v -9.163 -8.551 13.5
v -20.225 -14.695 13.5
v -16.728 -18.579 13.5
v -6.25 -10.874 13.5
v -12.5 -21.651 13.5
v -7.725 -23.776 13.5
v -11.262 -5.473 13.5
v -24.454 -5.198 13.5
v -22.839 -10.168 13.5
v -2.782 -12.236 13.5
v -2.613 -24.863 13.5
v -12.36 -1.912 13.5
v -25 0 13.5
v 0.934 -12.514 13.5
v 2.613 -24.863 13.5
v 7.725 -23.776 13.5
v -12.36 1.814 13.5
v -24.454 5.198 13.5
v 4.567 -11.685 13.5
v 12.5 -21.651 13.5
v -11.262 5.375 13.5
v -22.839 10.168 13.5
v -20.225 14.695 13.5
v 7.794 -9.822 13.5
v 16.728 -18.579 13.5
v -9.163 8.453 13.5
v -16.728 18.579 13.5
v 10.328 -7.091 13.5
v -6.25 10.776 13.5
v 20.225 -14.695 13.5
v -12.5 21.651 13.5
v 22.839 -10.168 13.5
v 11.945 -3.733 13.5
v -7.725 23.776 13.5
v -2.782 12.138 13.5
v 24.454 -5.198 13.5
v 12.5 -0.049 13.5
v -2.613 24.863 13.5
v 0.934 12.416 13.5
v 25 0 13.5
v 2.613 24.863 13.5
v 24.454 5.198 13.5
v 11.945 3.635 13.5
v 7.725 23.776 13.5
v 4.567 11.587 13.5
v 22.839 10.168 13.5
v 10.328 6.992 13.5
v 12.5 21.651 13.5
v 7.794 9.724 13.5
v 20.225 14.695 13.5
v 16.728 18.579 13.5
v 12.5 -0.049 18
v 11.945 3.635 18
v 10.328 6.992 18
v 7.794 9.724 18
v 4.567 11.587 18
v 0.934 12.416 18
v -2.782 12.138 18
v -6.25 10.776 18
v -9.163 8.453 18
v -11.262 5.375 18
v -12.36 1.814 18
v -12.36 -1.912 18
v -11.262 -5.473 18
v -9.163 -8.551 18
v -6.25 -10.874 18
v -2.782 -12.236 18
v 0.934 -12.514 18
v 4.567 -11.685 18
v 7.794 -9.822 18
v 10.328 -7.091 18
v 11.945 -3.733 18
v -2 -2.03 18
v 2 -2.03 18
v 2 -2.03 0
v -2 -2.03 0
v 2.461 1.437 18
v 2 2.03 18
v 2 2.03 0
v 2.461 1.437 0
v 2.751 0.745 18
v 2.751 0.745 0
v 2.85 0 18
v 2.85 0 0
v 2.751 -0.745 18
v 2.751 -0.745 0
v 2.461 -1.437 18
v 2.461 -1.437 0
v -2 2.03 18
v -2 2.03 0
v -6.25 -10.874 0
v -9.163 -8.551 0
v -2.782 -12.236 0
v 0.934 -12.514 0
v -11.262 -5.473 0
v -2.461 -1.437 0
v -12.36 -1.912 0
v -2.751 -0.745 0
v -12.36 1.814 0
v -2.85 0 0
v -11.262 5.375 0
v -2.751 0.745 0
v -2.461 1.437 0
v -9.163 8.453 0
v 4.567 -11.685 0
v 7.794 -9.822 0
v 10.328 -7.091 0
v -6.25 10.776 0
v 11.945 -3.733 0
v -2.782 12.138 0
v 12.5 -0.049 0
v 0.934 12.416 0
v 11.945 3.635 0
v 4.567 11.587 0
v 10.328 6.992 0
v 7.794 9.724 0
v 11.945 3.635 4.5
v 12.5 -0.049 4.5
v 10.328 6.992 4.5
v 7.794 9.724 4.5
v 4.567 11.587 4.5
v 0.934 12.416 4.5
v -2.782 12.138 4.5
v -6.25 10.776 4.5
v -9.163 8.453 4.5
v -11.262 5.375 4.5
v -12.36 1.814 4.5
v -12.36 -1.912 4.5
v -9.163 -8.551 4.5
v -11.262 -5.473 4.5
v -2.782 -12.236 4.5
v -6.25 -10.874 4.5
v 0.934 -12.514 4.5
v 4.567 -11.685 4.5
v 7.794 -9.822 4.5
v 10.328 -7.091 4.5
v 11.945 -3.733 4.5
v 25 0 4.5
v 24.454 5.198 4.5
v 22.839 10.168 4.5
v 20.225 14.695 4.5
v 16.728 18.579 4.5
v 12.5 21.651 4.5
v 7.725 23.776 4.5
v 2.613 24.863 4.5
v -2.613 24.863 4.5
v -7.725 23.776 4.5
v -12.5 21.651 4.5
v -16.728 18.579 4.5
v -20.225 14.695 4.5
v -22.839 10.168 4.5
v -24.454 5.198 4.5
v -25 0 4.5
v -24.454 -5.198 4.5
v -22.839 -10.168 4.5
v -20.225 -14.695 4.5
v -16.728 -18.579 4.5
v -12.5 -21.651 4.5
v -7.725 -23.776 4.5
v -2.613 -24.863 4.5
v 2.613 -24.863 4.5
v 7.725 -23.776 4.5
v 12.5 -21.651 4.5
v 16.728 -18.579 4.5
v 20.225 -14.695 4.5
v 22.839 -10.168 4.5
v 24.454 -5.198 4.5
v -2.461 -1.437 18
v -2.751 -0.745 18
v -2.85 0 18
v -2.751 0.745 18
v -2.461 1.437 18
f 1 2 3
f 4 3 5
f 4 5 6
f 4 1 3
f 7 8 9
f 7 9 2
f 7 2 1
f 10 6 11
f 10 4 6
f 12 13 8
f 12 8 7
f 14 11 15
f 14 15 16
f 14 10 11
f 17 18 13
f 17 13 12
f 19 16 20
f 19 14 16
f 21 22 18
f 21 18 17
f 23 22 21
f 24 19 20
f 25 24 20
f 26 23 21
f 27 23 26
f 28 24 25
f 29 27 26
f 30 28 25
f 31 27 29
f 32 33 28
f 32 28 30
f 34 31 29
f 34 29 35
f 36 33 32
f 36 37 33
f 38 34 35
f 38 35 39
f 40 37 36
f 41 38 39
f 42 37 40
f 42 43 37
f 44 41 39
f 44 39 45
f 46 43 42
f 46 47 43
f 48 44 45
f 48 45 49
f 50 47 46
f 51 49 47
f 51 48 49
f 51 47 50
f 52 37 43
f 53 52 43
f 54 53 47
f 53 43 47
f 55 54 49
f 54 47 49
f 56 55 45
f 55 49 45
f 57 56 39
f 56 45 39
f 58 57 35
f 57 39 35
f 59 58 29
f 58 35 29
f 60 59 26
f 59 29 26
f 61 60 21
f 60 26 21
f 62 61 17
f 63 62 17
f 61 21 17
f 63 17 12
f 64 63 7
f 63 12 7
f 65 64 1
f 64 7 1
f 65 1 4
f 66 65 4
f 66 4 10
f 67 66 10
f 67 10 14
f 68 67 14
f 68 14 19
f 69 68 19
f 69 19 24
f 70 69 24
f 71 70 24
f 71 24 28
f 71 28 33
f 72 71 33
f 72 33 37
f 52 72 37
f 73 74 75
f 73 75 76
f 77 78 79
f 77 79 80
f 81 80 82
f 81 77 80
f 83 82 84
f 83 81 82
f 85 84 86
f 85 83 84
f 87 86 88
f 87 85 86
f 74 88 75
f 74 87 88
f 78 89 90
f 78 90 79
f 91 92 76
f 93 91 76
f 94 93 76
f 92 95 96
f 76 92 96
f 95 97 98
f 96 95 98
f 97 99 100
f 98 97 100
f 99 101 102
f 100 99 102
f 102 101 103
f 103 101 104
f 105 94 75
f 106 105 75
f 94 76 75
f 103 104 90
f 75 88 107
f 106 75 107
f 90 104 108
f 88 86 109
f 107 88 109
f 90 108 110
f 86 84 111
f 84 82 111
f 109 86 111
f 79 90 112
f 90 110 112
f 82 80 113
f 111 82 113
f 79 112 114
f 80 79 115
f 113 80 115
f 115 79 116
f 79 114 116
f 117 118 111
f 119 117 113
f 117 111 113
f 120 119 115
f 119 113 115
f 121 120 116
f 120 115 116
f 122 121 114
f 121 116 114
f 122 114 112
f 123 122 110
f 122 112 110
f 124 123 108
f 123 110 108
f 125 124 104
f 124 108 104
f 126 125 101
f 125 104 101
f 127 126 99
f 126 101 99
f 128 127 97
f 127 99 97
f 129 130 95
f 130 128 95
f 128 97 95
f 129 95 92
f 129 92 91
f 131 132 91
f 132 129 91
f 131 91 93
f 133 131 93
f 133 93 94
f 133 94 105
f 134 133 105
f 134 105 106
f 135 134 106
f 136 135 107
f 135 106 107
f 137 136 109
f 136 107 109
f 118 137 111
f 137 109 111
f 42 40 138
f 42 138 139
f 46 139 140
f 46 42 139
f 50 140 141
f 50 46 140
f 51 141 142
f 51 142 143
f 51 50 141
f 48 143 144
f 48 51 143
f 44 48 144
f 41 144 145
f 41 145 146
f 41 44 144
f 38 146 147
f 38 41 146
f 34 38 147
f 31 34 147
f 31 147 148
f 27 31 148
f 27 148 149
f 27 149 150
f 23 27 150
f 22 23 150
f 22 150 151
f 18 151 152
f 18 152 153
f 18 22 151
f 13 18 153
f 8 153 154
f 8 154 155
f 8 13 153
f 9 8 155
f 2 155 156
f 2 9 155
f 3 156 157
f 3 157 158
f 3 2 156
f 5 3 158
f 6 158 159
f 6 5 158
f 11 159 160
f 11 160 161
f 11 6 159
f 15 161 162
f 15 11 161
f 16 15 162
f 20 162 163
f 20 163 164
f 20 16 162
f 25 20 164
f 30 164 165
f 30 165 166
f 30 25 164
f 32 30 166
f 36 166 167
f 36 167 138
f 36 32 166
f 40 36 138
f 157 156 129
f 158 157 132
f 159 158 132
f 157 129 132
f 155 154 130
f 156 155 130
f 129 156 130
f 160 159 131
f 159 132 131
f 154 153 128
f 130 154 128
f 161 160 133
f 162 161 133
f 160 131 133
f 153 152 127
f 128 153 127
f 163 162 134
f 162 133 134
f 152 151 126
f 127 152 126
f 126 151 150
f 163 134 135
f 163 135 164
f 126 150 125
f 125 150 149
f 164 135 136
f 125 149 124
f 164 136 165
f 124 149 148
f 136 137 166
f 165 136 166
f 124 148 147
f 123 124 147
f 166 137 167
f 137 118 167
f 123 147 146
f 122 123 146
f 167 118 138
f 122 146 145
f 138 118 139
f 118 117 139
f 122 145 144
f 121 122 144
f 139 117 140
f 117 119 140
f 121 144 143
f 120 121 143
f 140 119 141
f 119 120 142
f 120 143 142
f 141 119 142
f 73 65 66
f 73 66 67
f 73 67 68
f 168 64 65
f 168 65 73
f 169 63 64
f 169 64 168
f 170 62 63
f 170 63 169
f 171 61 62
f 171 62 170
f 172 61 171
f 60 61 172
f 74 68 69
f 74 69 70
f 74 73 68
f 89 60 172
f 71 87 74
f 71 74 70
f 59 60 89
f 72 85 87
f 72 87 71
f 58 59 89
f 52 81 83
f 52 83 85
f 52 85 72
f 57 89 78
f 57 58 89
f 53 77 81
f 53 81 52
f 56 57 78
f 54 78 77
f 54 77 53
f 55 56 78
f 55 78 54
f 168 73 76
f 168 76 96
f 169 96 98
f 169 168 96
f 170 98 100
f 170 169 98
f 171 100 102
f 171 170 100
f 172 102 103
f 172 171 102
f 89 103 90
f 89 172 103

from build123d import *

# Parameters (mm, degrees)
SKETCH1_R           = 12.5
BOSS_EXTRUDE1_DEPTH = 18
BOSS_EXTRUDE2_START = -4.5
SKETCH2_R           = 25
BOSS_EXTRUDE2_DEPTH = 9
CUT_EXTRUDE1_DEPTH  = 19


with BuildPart() as part:
    # Sketch1 → Boss-Extrude1 (new body)
    with BuildSketch(Plane.XY):
        with Locations((0, -0.049046118)):
            Circle(SKETCH1_R)
    extrude(amount=BOSS_EXTRUDE1_DEPTH)

    # Sketch2 → Boss-Extrude2 (add)
    with BuildSketch(Plane.XY.offset(18).offset(BOSS_EXTRUDE2_START)):
        Circle(SKETCH2_R)
    extrude(amount=-BOSS_EXTRUDE2_DEPTH)

    # Sketch3 → Cut-Extrude1 (cut, through all)
    with BuildSketch(Plane.XY.offset(18)):
        with BuildLine():
            Line((-2, 2.03039405), (2, 2.03039405))
            ThreePointArc((2, 2.03039405), (2.85, 0), (2, -2.03039405))
            Line((2, -2.03039405), (-2, -2.03039405))
            ThreePointArc((-2, -2.03039405), (-2.85, 0), (-2, 2.03039405))
        make_face()
    extrude(amount=-CUT_EXTRUDE1_DEPTH, mode=Mode.SUBTRACT)


solid = part.part
